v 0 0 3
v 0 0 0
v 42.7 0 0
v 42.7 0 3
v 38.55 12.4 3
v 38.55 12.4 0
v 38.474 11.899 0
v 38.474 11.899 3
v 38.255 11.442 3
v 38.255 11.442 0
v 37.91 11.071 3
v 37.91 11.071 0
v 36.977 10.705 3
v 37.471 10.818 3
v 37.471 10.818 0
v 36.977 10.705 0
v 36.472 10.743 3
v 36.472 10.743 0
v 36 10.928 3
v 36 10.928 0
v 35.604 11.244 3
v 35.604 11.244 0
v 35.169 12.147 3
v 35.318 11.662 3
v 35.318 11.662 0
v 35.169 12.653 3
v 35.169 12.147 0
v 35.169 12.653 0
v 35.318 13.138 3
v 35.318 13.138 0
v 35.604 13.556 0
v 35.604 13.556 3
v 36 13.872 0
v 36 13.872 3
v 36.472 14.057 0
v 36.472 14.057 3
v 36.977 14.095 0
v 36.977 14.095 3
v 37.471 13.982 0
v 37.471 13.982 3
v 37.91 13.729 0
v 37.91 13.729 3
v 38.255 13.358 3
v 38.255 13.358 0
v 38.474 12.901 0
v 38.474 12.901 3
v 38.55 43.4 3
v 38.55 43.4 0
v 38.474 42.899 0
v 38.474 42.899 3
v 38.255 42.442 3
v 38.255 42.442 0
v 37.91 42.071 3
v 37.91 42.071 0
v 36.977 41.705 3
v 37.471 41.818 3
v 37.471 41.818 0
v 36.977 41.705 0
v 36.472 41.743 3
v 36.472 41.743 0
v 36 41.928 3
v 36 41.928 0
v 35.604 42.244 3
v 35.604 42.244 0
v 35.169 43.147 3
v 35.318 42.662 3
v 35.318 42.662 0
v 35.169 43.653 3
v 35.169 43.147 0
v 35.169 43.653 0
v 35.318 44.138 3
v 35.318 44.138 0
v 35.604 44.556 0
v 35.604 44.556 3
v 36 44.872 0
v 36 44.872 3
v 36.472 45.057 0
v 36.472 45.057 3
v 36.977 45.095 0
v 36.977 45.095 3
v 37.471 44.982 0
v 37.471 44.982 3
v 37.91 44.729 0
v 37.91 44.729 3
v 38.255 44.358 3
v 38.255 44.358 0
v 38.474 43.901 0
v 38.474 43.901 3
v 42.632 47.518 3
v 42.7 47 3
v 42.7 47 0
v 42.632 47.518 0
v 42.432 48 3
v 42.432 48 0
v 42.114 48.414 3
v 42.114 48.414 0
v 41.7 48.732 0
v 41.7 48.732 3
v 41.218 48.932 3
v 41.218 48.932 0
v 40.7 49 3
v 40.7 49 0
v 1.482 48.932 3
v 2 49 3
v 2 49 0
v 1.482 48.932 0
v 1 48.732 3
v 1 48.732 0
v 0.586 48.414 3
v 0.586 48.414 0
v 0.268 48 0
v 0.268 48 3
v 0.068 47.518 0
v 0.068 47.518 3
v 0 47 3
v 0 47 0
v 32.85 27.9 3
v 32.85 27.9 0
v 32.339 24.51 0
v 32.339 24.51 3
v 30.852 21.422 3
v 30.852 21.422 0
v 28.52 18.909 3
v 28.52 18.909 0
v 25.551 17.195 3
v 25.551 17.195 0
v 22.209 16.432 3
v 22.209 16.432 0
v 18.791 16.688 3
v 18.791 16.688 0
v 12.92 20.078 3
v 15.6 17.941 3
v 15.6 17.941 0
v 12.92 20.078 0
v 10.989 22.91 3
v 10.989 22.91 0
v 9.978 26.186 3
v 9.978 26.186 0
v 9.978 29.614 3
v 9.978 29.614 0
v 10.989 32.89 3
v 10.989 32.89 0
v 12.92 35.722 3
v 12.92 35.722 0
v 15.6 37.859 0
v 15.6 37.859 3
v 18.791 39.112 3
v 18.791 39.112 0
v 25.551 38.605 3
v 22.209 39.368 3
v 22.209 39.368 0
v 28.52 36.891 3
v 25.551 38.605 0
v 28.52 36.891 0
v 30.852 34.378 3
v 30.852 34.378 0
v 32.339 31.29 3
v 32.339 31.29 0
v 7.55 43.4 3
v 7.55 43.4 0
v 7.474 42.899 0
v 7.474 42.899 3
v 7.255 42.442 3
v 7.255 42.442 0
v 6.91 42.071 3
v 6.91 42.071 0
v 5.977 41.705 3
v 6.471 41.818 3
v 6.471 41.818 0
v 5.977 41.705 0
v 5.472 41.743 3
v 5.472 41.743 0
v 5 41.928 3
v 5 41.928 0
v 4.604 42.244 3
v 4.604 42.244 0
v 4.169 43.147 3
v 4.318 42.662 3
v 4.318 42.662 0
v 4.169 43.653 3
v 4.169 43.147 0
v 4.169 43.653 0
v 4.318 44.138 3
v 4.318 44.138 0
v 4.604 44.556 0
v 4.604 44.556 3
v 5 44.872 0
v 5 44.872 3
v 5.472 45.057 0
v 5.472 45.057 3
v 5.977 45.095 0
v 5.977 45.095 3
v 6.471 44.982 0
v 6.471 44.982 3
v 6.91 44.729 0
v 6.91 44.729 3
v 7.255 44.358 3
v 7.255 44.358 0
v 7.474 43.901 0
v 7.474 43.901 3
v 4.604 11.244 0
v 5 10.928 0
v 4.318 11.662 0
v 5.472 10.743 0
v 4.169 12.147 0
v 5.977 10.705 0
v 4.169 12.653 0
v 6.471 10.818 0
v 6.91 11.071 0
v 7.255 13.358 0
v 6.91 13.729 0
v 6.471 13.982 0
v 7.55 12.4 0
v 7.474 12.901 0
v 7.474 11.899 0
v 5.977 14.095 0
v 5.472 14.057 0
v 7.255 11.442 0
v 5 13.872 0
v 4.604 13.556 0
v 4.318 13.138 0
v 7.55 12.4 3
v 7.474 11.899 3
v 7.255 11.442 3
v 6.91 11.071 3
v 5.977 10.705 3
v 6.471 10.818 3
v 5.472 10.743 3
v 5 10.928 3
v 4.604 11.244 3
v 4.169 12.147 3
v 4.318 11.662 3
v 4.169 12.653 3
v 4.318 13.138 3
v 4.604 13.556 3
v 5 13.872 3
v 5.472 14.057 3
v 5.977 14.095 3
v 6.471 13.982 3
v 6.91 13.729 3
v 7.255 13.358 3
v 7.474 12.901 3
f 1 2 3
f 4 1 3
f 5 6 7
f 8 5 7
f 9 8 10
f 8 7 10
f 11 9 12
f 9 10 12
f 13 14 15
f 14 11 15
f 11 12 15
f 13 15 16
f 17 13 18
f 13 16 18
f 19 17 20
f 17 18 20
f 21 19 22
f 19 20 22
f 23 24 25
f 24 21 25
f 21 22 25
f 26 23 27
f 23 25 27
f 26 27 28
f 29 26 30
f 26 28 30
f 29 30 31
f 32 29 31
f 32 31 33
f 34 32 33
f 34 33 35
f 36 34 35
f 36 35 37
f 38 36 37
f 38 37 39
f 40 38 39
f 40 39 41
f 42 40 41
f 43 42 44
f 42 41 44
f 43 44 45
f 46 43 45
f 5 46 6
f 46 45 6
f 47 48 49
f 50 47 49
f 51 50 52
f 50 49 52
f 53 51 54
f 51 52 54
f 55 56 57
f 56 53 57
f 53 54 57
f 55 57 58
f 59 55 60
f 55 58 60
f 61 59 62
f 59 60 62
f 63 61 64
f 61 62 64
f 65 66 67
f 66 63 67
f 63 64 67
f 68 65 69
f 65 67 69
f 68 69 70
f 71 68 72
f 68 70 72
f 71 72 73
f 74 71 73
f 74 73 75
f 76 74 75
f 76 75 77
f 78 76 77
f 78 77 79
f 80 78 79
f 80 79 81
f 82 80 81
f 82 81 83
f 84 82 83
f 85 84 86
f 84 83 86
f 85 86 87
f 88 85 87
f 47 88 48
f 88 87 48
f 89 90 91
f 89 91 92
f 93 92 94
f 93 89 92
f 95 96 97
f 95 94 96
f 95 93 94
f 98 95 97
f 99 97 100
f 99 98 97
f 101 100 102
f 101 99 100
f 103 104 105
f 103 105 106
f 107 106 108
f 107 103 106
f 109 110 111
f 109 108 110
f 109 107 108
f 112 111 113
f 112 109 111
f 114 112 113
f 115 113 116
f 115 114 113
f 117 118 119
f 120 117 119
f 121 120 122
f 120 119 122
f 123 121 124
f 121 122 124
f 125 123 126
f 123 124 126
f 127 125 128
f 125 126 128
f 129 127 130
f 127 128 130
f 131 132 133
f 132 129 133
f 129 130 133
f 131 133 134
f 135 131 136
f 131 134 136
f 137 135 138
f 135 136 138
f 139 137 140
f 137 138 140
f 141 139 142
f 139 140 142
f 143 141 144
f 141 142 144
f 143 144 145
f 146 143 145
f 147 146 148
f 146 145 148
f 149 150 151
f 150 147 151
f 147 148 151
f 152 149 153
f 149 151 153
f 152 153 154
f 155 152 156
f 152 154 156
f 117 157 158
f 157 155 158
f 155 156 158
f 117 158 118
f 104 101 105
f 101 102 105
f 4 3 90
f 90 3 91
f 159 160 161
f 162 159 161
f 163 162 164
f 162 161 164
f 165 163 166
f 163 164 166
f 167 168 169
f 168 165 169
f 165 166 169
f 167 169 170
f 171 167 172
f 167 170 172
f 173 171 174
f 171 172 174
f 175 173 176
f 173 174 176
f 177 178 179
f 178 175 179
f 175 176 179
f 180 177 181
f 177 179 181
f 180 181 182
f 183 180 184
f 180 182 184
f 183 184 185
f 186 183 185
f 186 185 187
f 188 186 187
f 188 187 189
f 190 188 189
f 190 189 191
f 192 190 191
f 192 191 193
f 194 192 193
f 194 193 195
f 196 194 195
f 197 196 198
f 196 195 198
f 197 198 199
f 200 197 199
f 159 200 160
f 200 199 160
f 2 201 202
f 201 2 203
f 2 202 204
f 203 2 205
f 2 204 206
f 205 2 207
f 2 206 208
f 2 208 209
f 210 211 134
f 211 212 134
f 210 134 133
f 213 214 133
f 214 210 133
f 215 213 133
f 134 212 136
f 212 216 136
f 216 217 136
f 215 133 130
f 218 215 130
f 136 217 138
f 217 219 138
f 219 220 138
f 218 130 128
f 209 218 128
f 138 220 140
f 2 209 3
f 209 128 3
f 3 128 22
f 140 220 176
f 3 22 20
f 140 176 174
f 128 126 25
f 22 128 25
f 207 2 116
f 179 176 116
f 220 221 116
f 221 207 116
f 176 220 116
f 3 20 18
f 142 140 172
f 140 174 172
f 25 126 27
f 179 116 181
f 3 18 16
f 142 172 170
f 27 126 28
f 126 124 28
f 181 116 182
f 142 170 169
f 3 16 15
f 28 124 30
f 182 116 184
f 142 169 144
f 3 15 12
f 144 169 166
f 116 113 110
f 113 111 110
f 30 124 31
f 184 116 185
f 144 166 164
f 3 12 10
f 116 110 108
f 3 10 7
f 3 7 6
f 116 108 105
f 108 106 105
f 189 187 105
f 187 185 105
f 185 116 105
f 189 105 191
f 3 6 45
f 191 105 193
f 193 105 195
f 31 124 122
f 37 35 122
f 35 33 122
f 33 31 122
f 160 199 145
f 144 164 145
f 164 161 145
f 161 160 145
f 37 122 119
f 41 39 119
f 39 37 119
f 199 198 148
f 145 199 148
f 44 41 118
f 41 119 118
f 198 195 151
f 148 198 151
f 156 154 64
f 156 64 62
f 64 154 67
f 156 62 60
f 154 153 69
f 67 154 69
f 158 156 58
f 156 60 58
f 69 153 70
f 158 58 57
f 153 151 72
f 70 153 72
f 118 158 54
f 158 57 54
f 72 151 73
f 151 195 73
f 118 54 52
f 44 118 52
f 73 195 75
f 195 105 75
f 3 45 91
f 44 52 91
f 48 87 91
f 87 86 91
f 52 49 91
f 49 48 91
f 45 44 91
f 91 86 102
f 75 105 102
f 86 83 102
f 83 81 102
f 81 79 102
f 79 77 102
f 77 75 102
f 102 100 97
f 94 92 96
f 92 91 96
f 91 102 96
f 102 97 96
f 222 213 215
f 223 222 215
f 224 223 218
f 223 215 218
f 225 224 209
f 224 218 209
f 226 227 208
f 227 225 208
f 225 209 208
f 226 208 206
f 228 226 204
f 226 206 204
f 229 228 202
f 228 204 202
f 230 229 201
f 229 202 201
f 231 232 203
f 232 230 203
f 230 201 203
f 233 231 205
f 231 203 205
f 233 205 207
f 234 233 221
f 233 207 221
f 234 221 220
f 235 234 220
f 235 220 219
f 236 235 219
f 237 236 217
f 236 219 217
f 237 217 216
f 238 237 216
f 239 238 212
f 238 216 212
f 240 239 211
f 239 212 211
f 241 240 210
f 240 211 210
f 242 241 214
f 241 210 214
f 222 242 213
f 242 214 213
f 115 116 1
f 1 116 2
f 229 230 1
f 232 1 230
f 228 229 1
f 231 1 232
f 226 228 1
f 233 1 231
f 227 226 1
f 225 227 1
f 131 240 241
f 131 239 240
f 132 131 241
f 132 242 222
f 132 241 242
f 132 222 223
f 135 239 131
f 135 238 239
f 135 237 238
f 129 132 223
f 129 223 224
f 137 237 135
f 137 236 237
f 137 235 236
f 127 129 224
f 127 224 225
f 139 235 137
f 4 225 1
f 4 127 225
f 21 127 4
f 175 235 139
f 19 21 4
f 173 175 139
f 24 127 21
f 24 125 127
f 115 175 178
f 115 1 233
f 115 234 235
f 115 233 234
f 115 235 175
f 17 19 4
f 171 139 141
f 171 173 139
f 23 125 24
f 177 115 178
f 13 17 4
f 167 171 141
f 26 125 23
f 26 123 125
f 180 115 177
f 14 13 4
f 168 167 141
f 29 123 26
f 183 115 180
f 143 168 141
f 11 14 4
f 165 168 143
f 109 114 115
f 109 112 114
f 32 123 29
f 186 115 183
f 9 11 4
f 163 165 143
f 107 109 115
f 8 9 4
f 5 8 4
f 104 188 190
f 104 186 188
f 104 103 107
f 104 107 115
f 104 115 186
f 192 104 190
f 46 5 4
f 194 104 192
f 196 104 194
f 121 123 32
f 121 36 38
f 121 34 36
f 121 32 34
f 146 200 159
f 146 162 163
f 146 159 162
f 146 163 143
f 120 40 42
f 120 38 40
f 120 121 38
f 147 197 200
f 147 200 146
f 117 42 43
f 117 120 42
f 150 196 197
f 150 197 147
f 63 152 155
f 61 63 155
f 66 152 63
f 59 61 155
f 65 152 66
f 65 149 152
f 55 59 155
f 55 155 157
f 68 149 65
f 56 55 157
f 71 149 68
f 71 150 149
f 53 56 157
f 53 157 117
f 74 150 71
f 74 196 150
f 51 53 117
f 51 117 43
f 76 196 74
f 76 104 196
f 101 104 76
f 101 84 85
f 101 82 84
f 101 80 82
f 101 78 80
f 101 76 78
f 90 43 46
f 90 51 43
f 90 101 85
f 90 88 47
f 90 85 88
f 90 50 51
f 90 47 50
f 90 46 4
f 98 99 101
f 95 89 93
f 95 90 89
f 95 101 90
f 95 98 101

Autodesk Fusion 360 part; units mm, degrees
sketch "Sketch1" plane through (0, 0, 0) normal (0, 0, 1) x (1, 0, 0)
  line L0 (0, 0) -> (42.7, 0)
  line L1 (42.7, 0) -> (42.7, 49)
  line L2 (42.7, 49) -> (0, 49)
  line L3 (0, 49) -> (0, 0)
  circle A0 centre (21.35, 27.9) radius 11.5
  circle A1 centre (5.85, 43.4) radius 1.7
  line L4 (21.35, 49) -> (21.35, 0) construction
  circle A2 centre (5.85, 12.4) radius 1.7
  circle A3 centre (36.85, 43.4) radius 1.7
  circle A4 centre (36.85, 12.4) radius 1.7
  dimension "d1" = 49
  dimension "d2" = 42.7
  dimension "d3" = 9.6
  dimension "d4" = 15.5
  dimension "d5" = 15.5
  dimension "d6" = 3.4
  dimension "d9" = 31
  dimension "d10" = 31
  dimension "d11" = 23
extrude "Extrude1" add sketch "Sketch1" along normal blind 3
fillet "Fillet1" radius 2 2 edges at (0, 49, 1.5) (42.7, 49, 1.5)
